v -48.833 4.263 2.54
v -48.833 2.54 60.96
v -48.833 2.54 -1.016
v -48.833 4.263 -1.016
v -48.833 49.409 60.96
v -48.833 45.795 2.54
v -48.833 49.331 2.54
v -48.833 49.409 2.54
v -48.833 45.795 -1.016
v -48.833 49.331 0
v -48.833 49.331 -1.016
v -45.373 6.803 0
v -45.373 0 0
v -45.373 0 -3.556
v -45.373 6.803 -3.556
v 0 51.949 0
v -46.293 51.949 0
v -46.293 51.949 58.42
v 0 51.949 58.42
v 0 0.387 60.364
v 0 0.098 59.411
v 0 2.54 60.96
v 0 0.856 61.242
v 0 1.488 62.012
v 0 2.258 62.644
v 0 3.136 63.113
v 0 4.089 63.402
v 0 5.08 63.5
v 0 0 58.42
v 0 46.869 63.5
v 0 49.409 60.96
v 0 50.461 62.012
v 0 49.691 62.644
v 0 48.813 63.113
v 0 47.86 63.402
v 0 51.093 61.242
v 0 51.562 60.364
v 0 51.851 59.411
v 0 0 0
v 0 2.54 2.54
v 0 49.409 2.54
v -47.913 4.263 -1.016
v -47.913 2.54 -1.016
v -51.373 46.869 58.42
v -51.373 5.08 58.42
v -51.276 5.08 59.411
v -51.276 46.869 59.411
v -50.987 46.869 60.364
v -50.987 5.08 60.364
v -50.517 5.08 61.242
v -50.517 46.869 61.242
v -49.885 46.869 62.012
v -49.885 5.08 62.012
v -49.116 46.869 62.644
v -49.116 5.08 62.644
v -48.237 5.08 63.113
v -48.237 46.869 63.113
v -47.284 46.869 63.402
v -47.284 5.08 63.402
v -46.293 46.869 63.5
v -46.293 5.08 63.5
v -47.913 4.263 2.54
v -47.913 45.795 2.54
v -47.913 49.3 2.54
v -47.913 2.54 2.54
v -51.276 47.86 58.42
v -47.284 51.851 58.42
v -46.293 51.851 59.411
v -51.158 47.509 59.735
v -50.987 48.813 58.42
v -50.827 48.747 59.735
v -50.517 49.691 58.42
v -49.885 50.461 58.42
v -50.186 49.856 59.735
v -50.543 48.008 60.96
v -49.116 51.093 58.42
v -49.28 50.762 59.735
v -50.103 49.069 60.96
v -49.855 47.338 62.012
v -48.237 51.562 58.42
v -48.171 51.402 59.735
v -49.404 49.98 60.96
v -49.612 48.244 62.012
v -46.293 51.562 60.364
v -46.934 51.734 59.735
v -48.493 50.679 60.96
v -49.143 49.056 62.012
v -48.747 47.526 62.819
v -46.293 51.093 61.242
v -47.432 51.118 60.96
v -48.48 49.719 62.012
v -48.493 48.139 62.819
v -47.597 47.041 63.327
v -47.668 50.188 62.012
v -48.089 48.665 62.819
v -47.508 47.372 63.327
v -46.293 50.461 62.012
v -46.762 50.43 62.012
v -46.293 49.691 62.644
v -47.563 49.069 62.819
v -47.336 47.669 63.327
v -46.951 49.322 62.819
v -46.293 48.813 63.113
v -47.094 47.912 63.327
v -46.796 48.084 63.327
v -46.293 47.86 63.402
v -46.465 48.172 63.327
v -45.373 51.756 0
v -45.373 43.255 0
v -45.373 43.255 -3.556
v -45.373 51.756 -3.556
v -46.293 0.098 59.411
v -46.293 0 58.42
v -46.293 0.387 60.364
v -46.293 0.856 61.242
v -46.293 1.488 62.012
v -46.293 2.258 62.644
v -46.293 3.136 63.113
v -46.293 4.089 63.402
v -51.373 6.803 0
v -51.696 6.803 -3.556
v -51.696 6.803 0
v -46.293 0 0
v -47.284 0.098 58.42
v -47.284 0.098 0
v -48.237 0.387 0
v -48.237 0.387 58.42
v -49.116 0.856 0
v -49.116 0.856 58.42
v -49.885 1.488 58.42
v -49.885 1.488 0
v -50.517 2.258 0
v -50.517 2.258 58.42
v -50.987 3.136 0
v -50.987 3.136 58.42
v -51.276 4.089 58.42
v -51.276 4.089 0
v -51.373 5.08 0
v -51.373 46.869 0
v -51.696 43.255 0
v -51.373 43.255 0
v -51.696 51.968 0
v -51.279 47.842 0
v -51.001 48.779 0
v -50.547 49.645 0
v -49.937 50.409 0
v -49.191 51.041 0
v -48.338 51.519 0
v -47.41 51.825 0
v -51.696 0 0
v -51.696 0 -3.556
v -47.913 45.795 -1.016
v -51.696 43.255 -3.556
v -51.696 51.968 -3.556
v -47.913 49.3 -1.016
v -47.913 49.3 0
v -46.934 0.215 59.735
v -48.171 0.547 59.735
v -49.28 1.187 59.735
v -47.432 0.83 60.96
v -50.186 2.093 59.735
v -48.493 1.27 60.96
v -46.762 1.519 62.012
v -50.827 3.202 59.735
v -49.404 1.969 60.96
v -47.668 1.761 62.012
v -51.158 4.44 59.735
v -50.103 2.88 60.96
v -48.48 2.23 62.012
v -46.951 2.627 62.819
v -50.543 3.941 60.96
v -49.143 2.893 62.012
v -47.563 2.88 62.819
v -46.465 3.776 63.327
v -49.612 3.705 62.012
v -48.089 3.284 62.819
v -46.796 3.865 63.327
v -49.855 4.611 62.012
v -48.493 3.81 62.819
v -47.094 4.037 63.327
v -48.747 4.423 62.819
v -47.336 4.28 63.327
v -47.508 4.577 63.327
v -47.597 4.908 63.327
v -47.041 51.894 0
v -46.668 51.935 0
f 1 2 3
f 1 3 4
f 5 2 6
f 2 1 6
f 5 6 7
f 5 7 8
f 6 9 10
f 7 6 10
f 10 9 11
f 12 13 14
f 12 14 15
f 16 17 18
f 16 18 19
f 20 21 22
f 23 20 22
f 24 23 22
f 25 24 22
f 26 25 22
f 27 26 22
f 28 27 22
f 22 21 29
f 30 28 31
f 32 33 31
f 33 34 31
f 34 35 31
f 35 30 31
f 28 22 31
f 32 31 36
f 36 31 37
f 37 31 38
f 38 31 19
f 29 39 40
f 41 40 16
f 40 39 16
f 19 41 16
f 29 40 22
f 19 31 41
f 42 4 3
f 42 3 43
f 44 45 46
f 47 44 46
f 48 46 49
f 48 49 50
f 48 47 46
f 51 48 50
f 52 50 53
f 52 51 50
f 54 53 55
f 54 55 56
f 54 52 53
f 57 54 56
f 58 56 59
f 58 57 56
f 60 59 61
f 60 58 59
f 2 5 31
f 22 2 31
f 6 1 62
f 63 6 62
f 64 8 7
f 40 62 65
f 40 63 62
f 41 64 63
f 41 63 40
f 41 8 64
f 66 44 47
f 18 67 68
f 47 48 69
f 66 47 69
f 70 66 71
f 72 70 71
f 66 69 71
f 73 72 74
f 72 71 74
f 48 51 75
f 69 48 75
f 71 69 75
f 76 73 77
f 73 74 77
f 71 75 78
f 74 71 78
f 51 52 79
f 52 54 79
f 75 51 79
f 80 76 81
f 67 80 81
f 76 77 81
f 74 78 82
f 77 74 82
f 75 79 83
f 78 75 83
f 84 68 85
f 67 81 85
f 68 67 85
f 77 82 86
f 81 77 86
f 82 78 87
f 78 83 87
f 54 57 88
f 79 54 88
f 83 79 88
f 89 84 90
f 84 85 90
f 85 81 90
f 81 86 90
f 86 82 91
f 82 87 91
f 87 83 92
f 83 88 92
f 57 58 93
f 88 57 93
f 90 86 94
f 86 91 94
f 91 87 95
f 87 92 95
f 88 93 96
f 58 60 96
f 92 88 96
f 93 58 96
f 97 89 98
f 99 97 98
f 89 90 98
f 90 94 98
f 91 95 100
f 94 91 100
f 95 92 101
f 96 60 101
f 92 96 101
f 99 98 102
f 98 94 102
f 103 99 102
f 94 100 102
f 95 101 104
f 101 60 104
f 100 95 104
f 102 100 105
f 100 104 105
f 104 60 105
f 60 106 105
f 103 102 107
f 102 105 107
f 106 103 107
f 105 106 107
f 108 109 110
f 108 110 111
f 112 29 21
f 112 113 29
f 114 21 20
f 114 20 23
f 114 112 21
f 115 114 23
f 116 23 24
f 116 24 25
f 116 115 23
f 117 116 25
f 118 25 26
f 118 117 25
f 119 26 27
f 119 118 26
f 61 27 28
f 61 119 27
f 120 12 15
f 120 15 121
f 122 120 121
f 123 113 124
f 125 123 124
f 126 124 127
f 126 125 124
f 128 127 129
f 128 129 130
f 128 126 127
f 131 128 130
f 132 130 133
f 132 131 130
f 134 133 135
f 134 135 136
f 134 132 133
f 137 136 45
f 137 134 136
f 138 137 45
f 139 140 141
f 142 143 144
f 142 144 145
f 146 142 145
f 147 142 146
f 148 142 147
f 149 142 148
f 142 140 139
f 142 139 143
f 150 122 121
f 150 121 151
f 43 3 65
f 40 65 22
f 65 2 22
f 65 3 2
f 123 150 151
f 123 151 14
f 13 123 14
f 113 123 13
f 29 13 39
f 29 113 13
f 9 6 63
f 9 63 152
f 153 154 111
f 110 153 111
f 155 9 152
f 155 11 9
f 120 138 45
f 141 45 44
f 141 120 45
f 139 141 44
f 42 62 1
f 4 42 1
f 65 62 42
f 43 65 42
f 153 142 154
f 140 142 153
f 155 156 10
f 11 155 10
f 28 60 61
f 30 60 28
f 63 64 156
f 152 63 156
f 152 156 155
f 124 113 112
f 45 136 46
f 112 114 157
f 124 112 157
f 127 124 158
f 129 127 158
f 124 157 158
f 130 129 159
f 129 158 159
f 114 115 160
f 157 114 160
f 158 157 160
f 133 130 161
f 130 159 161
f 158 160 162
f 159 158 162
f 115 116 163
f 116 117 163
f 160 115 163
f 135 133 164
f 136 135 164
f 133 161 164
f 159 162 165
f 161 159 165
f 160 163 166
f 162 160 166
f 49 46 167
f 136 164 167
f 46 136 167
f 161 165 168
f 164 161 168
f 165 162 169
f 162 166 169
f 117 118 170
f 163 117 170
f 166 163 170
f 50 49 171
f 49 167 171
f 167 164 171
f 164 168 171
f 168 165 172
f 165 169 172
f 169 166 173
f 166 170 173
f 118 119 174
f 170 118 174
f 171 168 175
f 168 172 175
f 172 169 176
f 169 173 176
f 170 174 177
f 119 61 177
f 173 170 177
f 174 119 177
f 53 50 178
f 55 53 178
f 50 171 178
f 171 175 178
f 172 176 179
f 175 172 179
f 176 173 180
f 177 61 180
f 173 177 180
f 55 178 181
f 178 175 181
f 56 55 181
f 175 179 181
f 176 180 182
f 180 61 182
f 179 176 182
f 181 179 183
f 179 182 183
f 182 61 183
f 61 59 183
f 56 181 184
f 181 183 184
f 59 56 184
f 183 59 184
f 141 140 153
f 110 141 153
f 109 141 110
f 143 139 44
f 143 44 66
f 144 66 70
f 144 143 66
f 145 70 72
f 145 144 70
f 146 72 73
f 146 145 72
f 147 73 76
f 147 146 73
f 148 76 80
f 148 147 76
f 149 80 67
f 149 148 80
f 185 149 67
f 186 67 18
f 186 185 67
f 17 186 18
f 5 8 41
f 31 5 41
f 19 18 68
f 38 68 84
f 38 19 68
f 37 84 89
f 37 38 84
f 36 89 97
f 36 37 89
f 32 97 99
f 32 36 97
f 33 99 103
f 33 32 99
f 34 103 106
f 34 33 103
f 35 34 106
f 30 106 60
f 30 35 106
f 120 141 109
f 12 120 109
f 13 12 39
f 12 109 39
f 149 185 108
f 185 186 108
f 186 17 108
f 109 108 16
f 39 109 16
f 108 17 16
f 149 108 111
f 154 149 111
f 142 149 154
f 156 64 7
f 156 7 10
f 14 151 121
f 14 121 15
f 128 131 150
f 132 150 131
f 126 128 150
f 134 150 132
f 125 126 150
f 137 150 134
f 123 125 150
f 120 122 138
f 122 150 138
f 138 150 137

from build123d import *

# Parameters (mm, degrees)
F0_W         = 51.3733290136
F0_H         = 51.9489385188
F1_DEPTH     = 63.5
F3_DEPTH     = 3.556
F4_T         = 2.54
F4_T3_DEPTH  = 13.7734491992
F4_T5_DEPTH  = 11.8834199066
F4_T7_DEPTH  = 11.0801313686
F4_T9_DEPTH  = 13.5809922736
F4_T11_DEPTH = 10.8262574938
F4_T13_DEPTH = 5.3370977176
F5_T1_DEPTH  = 76.2
F6_R         = 5.08


# Not quite as in the source:
# - a fillet or chamfer that OpenCascade refuses, or shapes differently, is made with other operations: its cross-section is extruded or revolved along the edge and cut away or added
# - a shell that OpenCascade refuses in one call is made with other operations: the cavity is built on its own and cut out


with BuildPart() as f1:
    # F0 (on Top) → F1 (new body)
    with BuildSketch(Plane.XY):
        with Locations((-25.6866645068, 25.9744692594)):
            Rectangle(F0_W, F0_H)
    extrude(amount=F1_DEPTH)

    # F2 (on Top) → F3 (join)
    with BuildSketch(Plane.XY):
        Polygon((-51.6957342625, 3.4017099533), (-51.6957342625, 0), (-45.3731976449, 0), (-45.3731976449, 6.8034199066), (-51.6957342625, 6.8034199066), align=None)
        Polygon((-45.3731976449, 43.2554893196), (-45.3731976449, 51.7564815932), (-51.6957342625, 51.9683584571), (-51.6957342625, 47.6119238883), (-51.6957342625, 43.2554893196), align=None)
    extrude(amount=-F3_DEPTH)

    # F4: shell of thickness 2.54, made by hand


with BuildPart() as f4_core1:
    # F4_t2: copy of F1
    add(f1.part)

    # the walls: a layer under each face that stays
    f4_faces = [f4_core1.faces().sort_by_distance(p)[0] for p in [
        (-25.8478671312, 0, 29.972),
        (-51.3733290136, 25.9744692594, 31.75),
        (-25.6866645068, 25.9744692594, 0),
        (-25.6866645068, 25.9744692594, 63.5),
        (-25.6866645068, 51.9489385188, 31.75),
        (-51.4059827792, 47.6119238883, 0),
        (-51.534531638, 3.4017099533, 0),
        (-51.6957342625, 3.4017099533, -1.778),
        (-45.3731976449, 3.4017099533, -1.778),
        (-48.5344659537, 3.4017099533, -3.556),
        (-48.5344659537, 6.8034199066, -1.778),
        (-48.5344659537, 43.2554893196, -1.778),
        (-45.3731976449, 47.5059854564, -1.778),
        (-48.5344659537, 51.8624200251, -1.778),
        (-51.6957342625, 47.6119238883, -1.778),
        (-48.5344659537, 47.6119238883, -3.556),
    ]]
    thicken(f4_faces, amount=-F4_T, mode=Mode.SUBTRACT)

    # F4_s4 → F4_t3 (cut)
    with BuildSketch(Plane.XZ.offset(-54.4889385188)):
        Polygon((-51.3987290136, 0.0254), (-48.8333290136, 0), (-48.8333290136, -2.54), (-51.3733290136, -2.54), align=None)
    extrude(amount=F4_T3_DEPTH, mode=Mode.SUBTRACT)

    # F4_s6 → F4_t5 (cut)
    with BuildSketch(Plane.XZ.offset(-9.3434199066)):
        Polygon((-51.3987290136, 0.0254), (-48.8333290136, 0), (-48.8333290136, -2.54), (-51.3733290136, -2.54), align=None)
        Polygon((-45.3477976449, -0.0254), (-45.3731976449, 2.54), (-47.9131976449, 2.54), (-47.9131976449, 0), align=None)
    extrude(amount=F4_T5_DEPTH, mode=Mode.SUBTRACT)

    # F4_s8 → F4_t7 (cut)
    with BuildSketch(Plane.YZ.offset(-53.9133290136)):
        Polygon((6.8288199066, -0.0254), (6.8034199066, 2.54), (4.2634199066, 2.54), (4.2634199066, 0), align=None)
        Polygon((43.2300893196, -0.0254), (43.2554893196, 2.54), (45.7954893196, 2.54), (45.7954893196, 0), align=None)
    extrude(amount=F4_T7_DEPTH, mode=Mode.SUBTRACT)

    # F4_s10 → F4_t9 (cut)
    with BuildSketch(Plane.XZ.offset(-54.2964815932)):
        Polygon((-45.3477976449, -0.0254), (-45.3731976449, 2.54), (-47.9131976449, 2.54), (-47.9131976449, 0), align=None)
    extrude(amount=F4_T9_DEPTH, mode=Mode.SUBTRACT)

    # F4_s12 → F4_t11 (cut)
    with BuildSketch(Plane(origin=(-44.5162101899, 1.4917991907, 0), x_dir=(0, 0, 1), z_dir=(-0.9994389665, 0.033492569, 0))):
        Polygon((-0.0254, 50.2331795219), (2.54, 50.2077795219), (2.54, 47.6677795219), (0, 47.6677795219), align=None)
    extrude(amount=F4_T11_DEPTH, mode=Mode.SUBTRACT)

    # F4_s14 → F4_t13 (cut)
    with BuildSketch(Plane.YZ.offset(-53.9133290136)):
        Polygon((51.9743385188, 0.0254), (49.4089385188, 0), (49.4089385188, -2.54), (51.9489385188, -2.54), align=None)
    extrude(amount=F4_T13_DEPTH, mode=Mode.SUBTRACT)


with BuildPart() as f1_1:
    add(f1.part)

    # what is left inside the walls is the cavity
    f4_cavity = [f4_core1.part.solids().sort_by_distance(p)[0] for p in [
        (-24.416665, 2.5654, 40.301333),
    ]]
    add(f4_cavity, mode=Mode.SUBTRACT)

    # F5: fillet of radius 5.08 on 2 edges, made by hand

    # F5_s2 → F5_t1 (cut)
    with BuildSketch(Plane.XY):
        with BuildLine():
            ThreePointArc((-46.2933290136, 0), (-49.885431462, 1.4878975516), (-51.3733290136, 5.08))
            Line((-51.3733290136, 5.08), (-51.3733290136, 0))
            Line((-51.3733290136, 0), (-46.2933290136, 0))
        make_face()
        with BuildLine():
            ThreePointArc((-51.3733290136, 46.8689385188), (-49.885431462, 50.4610409672), (-46.2933290136, 51.9489385188))
            Line((-46.2933290136, 51.9489385188), (-51.3733290136, 51.9489385188))
            Line((-51.3733290136, 51.9489385188), (-51.3733290136, 46.8689385188))
        make_face()
    extrude(amount=F5_T1_DEPTH, mode=Mode.SUBTRACT)

    # F6
    f6_edges = [f1_1.edges().sort_by_distance(p)[0] for p in [
        (-51.373329, 25.974469, 63.5),
        (-23.146665, 0, 63.5),
        (-23.146665, 51.948939, 63.5),
        (-49.885431, 50.461041, 63.5),
        (-49.885431, 1.487898, 63.5),
    ]]
    fillet(f6_edges, radius=F6_R)


solid = f1_1.part
